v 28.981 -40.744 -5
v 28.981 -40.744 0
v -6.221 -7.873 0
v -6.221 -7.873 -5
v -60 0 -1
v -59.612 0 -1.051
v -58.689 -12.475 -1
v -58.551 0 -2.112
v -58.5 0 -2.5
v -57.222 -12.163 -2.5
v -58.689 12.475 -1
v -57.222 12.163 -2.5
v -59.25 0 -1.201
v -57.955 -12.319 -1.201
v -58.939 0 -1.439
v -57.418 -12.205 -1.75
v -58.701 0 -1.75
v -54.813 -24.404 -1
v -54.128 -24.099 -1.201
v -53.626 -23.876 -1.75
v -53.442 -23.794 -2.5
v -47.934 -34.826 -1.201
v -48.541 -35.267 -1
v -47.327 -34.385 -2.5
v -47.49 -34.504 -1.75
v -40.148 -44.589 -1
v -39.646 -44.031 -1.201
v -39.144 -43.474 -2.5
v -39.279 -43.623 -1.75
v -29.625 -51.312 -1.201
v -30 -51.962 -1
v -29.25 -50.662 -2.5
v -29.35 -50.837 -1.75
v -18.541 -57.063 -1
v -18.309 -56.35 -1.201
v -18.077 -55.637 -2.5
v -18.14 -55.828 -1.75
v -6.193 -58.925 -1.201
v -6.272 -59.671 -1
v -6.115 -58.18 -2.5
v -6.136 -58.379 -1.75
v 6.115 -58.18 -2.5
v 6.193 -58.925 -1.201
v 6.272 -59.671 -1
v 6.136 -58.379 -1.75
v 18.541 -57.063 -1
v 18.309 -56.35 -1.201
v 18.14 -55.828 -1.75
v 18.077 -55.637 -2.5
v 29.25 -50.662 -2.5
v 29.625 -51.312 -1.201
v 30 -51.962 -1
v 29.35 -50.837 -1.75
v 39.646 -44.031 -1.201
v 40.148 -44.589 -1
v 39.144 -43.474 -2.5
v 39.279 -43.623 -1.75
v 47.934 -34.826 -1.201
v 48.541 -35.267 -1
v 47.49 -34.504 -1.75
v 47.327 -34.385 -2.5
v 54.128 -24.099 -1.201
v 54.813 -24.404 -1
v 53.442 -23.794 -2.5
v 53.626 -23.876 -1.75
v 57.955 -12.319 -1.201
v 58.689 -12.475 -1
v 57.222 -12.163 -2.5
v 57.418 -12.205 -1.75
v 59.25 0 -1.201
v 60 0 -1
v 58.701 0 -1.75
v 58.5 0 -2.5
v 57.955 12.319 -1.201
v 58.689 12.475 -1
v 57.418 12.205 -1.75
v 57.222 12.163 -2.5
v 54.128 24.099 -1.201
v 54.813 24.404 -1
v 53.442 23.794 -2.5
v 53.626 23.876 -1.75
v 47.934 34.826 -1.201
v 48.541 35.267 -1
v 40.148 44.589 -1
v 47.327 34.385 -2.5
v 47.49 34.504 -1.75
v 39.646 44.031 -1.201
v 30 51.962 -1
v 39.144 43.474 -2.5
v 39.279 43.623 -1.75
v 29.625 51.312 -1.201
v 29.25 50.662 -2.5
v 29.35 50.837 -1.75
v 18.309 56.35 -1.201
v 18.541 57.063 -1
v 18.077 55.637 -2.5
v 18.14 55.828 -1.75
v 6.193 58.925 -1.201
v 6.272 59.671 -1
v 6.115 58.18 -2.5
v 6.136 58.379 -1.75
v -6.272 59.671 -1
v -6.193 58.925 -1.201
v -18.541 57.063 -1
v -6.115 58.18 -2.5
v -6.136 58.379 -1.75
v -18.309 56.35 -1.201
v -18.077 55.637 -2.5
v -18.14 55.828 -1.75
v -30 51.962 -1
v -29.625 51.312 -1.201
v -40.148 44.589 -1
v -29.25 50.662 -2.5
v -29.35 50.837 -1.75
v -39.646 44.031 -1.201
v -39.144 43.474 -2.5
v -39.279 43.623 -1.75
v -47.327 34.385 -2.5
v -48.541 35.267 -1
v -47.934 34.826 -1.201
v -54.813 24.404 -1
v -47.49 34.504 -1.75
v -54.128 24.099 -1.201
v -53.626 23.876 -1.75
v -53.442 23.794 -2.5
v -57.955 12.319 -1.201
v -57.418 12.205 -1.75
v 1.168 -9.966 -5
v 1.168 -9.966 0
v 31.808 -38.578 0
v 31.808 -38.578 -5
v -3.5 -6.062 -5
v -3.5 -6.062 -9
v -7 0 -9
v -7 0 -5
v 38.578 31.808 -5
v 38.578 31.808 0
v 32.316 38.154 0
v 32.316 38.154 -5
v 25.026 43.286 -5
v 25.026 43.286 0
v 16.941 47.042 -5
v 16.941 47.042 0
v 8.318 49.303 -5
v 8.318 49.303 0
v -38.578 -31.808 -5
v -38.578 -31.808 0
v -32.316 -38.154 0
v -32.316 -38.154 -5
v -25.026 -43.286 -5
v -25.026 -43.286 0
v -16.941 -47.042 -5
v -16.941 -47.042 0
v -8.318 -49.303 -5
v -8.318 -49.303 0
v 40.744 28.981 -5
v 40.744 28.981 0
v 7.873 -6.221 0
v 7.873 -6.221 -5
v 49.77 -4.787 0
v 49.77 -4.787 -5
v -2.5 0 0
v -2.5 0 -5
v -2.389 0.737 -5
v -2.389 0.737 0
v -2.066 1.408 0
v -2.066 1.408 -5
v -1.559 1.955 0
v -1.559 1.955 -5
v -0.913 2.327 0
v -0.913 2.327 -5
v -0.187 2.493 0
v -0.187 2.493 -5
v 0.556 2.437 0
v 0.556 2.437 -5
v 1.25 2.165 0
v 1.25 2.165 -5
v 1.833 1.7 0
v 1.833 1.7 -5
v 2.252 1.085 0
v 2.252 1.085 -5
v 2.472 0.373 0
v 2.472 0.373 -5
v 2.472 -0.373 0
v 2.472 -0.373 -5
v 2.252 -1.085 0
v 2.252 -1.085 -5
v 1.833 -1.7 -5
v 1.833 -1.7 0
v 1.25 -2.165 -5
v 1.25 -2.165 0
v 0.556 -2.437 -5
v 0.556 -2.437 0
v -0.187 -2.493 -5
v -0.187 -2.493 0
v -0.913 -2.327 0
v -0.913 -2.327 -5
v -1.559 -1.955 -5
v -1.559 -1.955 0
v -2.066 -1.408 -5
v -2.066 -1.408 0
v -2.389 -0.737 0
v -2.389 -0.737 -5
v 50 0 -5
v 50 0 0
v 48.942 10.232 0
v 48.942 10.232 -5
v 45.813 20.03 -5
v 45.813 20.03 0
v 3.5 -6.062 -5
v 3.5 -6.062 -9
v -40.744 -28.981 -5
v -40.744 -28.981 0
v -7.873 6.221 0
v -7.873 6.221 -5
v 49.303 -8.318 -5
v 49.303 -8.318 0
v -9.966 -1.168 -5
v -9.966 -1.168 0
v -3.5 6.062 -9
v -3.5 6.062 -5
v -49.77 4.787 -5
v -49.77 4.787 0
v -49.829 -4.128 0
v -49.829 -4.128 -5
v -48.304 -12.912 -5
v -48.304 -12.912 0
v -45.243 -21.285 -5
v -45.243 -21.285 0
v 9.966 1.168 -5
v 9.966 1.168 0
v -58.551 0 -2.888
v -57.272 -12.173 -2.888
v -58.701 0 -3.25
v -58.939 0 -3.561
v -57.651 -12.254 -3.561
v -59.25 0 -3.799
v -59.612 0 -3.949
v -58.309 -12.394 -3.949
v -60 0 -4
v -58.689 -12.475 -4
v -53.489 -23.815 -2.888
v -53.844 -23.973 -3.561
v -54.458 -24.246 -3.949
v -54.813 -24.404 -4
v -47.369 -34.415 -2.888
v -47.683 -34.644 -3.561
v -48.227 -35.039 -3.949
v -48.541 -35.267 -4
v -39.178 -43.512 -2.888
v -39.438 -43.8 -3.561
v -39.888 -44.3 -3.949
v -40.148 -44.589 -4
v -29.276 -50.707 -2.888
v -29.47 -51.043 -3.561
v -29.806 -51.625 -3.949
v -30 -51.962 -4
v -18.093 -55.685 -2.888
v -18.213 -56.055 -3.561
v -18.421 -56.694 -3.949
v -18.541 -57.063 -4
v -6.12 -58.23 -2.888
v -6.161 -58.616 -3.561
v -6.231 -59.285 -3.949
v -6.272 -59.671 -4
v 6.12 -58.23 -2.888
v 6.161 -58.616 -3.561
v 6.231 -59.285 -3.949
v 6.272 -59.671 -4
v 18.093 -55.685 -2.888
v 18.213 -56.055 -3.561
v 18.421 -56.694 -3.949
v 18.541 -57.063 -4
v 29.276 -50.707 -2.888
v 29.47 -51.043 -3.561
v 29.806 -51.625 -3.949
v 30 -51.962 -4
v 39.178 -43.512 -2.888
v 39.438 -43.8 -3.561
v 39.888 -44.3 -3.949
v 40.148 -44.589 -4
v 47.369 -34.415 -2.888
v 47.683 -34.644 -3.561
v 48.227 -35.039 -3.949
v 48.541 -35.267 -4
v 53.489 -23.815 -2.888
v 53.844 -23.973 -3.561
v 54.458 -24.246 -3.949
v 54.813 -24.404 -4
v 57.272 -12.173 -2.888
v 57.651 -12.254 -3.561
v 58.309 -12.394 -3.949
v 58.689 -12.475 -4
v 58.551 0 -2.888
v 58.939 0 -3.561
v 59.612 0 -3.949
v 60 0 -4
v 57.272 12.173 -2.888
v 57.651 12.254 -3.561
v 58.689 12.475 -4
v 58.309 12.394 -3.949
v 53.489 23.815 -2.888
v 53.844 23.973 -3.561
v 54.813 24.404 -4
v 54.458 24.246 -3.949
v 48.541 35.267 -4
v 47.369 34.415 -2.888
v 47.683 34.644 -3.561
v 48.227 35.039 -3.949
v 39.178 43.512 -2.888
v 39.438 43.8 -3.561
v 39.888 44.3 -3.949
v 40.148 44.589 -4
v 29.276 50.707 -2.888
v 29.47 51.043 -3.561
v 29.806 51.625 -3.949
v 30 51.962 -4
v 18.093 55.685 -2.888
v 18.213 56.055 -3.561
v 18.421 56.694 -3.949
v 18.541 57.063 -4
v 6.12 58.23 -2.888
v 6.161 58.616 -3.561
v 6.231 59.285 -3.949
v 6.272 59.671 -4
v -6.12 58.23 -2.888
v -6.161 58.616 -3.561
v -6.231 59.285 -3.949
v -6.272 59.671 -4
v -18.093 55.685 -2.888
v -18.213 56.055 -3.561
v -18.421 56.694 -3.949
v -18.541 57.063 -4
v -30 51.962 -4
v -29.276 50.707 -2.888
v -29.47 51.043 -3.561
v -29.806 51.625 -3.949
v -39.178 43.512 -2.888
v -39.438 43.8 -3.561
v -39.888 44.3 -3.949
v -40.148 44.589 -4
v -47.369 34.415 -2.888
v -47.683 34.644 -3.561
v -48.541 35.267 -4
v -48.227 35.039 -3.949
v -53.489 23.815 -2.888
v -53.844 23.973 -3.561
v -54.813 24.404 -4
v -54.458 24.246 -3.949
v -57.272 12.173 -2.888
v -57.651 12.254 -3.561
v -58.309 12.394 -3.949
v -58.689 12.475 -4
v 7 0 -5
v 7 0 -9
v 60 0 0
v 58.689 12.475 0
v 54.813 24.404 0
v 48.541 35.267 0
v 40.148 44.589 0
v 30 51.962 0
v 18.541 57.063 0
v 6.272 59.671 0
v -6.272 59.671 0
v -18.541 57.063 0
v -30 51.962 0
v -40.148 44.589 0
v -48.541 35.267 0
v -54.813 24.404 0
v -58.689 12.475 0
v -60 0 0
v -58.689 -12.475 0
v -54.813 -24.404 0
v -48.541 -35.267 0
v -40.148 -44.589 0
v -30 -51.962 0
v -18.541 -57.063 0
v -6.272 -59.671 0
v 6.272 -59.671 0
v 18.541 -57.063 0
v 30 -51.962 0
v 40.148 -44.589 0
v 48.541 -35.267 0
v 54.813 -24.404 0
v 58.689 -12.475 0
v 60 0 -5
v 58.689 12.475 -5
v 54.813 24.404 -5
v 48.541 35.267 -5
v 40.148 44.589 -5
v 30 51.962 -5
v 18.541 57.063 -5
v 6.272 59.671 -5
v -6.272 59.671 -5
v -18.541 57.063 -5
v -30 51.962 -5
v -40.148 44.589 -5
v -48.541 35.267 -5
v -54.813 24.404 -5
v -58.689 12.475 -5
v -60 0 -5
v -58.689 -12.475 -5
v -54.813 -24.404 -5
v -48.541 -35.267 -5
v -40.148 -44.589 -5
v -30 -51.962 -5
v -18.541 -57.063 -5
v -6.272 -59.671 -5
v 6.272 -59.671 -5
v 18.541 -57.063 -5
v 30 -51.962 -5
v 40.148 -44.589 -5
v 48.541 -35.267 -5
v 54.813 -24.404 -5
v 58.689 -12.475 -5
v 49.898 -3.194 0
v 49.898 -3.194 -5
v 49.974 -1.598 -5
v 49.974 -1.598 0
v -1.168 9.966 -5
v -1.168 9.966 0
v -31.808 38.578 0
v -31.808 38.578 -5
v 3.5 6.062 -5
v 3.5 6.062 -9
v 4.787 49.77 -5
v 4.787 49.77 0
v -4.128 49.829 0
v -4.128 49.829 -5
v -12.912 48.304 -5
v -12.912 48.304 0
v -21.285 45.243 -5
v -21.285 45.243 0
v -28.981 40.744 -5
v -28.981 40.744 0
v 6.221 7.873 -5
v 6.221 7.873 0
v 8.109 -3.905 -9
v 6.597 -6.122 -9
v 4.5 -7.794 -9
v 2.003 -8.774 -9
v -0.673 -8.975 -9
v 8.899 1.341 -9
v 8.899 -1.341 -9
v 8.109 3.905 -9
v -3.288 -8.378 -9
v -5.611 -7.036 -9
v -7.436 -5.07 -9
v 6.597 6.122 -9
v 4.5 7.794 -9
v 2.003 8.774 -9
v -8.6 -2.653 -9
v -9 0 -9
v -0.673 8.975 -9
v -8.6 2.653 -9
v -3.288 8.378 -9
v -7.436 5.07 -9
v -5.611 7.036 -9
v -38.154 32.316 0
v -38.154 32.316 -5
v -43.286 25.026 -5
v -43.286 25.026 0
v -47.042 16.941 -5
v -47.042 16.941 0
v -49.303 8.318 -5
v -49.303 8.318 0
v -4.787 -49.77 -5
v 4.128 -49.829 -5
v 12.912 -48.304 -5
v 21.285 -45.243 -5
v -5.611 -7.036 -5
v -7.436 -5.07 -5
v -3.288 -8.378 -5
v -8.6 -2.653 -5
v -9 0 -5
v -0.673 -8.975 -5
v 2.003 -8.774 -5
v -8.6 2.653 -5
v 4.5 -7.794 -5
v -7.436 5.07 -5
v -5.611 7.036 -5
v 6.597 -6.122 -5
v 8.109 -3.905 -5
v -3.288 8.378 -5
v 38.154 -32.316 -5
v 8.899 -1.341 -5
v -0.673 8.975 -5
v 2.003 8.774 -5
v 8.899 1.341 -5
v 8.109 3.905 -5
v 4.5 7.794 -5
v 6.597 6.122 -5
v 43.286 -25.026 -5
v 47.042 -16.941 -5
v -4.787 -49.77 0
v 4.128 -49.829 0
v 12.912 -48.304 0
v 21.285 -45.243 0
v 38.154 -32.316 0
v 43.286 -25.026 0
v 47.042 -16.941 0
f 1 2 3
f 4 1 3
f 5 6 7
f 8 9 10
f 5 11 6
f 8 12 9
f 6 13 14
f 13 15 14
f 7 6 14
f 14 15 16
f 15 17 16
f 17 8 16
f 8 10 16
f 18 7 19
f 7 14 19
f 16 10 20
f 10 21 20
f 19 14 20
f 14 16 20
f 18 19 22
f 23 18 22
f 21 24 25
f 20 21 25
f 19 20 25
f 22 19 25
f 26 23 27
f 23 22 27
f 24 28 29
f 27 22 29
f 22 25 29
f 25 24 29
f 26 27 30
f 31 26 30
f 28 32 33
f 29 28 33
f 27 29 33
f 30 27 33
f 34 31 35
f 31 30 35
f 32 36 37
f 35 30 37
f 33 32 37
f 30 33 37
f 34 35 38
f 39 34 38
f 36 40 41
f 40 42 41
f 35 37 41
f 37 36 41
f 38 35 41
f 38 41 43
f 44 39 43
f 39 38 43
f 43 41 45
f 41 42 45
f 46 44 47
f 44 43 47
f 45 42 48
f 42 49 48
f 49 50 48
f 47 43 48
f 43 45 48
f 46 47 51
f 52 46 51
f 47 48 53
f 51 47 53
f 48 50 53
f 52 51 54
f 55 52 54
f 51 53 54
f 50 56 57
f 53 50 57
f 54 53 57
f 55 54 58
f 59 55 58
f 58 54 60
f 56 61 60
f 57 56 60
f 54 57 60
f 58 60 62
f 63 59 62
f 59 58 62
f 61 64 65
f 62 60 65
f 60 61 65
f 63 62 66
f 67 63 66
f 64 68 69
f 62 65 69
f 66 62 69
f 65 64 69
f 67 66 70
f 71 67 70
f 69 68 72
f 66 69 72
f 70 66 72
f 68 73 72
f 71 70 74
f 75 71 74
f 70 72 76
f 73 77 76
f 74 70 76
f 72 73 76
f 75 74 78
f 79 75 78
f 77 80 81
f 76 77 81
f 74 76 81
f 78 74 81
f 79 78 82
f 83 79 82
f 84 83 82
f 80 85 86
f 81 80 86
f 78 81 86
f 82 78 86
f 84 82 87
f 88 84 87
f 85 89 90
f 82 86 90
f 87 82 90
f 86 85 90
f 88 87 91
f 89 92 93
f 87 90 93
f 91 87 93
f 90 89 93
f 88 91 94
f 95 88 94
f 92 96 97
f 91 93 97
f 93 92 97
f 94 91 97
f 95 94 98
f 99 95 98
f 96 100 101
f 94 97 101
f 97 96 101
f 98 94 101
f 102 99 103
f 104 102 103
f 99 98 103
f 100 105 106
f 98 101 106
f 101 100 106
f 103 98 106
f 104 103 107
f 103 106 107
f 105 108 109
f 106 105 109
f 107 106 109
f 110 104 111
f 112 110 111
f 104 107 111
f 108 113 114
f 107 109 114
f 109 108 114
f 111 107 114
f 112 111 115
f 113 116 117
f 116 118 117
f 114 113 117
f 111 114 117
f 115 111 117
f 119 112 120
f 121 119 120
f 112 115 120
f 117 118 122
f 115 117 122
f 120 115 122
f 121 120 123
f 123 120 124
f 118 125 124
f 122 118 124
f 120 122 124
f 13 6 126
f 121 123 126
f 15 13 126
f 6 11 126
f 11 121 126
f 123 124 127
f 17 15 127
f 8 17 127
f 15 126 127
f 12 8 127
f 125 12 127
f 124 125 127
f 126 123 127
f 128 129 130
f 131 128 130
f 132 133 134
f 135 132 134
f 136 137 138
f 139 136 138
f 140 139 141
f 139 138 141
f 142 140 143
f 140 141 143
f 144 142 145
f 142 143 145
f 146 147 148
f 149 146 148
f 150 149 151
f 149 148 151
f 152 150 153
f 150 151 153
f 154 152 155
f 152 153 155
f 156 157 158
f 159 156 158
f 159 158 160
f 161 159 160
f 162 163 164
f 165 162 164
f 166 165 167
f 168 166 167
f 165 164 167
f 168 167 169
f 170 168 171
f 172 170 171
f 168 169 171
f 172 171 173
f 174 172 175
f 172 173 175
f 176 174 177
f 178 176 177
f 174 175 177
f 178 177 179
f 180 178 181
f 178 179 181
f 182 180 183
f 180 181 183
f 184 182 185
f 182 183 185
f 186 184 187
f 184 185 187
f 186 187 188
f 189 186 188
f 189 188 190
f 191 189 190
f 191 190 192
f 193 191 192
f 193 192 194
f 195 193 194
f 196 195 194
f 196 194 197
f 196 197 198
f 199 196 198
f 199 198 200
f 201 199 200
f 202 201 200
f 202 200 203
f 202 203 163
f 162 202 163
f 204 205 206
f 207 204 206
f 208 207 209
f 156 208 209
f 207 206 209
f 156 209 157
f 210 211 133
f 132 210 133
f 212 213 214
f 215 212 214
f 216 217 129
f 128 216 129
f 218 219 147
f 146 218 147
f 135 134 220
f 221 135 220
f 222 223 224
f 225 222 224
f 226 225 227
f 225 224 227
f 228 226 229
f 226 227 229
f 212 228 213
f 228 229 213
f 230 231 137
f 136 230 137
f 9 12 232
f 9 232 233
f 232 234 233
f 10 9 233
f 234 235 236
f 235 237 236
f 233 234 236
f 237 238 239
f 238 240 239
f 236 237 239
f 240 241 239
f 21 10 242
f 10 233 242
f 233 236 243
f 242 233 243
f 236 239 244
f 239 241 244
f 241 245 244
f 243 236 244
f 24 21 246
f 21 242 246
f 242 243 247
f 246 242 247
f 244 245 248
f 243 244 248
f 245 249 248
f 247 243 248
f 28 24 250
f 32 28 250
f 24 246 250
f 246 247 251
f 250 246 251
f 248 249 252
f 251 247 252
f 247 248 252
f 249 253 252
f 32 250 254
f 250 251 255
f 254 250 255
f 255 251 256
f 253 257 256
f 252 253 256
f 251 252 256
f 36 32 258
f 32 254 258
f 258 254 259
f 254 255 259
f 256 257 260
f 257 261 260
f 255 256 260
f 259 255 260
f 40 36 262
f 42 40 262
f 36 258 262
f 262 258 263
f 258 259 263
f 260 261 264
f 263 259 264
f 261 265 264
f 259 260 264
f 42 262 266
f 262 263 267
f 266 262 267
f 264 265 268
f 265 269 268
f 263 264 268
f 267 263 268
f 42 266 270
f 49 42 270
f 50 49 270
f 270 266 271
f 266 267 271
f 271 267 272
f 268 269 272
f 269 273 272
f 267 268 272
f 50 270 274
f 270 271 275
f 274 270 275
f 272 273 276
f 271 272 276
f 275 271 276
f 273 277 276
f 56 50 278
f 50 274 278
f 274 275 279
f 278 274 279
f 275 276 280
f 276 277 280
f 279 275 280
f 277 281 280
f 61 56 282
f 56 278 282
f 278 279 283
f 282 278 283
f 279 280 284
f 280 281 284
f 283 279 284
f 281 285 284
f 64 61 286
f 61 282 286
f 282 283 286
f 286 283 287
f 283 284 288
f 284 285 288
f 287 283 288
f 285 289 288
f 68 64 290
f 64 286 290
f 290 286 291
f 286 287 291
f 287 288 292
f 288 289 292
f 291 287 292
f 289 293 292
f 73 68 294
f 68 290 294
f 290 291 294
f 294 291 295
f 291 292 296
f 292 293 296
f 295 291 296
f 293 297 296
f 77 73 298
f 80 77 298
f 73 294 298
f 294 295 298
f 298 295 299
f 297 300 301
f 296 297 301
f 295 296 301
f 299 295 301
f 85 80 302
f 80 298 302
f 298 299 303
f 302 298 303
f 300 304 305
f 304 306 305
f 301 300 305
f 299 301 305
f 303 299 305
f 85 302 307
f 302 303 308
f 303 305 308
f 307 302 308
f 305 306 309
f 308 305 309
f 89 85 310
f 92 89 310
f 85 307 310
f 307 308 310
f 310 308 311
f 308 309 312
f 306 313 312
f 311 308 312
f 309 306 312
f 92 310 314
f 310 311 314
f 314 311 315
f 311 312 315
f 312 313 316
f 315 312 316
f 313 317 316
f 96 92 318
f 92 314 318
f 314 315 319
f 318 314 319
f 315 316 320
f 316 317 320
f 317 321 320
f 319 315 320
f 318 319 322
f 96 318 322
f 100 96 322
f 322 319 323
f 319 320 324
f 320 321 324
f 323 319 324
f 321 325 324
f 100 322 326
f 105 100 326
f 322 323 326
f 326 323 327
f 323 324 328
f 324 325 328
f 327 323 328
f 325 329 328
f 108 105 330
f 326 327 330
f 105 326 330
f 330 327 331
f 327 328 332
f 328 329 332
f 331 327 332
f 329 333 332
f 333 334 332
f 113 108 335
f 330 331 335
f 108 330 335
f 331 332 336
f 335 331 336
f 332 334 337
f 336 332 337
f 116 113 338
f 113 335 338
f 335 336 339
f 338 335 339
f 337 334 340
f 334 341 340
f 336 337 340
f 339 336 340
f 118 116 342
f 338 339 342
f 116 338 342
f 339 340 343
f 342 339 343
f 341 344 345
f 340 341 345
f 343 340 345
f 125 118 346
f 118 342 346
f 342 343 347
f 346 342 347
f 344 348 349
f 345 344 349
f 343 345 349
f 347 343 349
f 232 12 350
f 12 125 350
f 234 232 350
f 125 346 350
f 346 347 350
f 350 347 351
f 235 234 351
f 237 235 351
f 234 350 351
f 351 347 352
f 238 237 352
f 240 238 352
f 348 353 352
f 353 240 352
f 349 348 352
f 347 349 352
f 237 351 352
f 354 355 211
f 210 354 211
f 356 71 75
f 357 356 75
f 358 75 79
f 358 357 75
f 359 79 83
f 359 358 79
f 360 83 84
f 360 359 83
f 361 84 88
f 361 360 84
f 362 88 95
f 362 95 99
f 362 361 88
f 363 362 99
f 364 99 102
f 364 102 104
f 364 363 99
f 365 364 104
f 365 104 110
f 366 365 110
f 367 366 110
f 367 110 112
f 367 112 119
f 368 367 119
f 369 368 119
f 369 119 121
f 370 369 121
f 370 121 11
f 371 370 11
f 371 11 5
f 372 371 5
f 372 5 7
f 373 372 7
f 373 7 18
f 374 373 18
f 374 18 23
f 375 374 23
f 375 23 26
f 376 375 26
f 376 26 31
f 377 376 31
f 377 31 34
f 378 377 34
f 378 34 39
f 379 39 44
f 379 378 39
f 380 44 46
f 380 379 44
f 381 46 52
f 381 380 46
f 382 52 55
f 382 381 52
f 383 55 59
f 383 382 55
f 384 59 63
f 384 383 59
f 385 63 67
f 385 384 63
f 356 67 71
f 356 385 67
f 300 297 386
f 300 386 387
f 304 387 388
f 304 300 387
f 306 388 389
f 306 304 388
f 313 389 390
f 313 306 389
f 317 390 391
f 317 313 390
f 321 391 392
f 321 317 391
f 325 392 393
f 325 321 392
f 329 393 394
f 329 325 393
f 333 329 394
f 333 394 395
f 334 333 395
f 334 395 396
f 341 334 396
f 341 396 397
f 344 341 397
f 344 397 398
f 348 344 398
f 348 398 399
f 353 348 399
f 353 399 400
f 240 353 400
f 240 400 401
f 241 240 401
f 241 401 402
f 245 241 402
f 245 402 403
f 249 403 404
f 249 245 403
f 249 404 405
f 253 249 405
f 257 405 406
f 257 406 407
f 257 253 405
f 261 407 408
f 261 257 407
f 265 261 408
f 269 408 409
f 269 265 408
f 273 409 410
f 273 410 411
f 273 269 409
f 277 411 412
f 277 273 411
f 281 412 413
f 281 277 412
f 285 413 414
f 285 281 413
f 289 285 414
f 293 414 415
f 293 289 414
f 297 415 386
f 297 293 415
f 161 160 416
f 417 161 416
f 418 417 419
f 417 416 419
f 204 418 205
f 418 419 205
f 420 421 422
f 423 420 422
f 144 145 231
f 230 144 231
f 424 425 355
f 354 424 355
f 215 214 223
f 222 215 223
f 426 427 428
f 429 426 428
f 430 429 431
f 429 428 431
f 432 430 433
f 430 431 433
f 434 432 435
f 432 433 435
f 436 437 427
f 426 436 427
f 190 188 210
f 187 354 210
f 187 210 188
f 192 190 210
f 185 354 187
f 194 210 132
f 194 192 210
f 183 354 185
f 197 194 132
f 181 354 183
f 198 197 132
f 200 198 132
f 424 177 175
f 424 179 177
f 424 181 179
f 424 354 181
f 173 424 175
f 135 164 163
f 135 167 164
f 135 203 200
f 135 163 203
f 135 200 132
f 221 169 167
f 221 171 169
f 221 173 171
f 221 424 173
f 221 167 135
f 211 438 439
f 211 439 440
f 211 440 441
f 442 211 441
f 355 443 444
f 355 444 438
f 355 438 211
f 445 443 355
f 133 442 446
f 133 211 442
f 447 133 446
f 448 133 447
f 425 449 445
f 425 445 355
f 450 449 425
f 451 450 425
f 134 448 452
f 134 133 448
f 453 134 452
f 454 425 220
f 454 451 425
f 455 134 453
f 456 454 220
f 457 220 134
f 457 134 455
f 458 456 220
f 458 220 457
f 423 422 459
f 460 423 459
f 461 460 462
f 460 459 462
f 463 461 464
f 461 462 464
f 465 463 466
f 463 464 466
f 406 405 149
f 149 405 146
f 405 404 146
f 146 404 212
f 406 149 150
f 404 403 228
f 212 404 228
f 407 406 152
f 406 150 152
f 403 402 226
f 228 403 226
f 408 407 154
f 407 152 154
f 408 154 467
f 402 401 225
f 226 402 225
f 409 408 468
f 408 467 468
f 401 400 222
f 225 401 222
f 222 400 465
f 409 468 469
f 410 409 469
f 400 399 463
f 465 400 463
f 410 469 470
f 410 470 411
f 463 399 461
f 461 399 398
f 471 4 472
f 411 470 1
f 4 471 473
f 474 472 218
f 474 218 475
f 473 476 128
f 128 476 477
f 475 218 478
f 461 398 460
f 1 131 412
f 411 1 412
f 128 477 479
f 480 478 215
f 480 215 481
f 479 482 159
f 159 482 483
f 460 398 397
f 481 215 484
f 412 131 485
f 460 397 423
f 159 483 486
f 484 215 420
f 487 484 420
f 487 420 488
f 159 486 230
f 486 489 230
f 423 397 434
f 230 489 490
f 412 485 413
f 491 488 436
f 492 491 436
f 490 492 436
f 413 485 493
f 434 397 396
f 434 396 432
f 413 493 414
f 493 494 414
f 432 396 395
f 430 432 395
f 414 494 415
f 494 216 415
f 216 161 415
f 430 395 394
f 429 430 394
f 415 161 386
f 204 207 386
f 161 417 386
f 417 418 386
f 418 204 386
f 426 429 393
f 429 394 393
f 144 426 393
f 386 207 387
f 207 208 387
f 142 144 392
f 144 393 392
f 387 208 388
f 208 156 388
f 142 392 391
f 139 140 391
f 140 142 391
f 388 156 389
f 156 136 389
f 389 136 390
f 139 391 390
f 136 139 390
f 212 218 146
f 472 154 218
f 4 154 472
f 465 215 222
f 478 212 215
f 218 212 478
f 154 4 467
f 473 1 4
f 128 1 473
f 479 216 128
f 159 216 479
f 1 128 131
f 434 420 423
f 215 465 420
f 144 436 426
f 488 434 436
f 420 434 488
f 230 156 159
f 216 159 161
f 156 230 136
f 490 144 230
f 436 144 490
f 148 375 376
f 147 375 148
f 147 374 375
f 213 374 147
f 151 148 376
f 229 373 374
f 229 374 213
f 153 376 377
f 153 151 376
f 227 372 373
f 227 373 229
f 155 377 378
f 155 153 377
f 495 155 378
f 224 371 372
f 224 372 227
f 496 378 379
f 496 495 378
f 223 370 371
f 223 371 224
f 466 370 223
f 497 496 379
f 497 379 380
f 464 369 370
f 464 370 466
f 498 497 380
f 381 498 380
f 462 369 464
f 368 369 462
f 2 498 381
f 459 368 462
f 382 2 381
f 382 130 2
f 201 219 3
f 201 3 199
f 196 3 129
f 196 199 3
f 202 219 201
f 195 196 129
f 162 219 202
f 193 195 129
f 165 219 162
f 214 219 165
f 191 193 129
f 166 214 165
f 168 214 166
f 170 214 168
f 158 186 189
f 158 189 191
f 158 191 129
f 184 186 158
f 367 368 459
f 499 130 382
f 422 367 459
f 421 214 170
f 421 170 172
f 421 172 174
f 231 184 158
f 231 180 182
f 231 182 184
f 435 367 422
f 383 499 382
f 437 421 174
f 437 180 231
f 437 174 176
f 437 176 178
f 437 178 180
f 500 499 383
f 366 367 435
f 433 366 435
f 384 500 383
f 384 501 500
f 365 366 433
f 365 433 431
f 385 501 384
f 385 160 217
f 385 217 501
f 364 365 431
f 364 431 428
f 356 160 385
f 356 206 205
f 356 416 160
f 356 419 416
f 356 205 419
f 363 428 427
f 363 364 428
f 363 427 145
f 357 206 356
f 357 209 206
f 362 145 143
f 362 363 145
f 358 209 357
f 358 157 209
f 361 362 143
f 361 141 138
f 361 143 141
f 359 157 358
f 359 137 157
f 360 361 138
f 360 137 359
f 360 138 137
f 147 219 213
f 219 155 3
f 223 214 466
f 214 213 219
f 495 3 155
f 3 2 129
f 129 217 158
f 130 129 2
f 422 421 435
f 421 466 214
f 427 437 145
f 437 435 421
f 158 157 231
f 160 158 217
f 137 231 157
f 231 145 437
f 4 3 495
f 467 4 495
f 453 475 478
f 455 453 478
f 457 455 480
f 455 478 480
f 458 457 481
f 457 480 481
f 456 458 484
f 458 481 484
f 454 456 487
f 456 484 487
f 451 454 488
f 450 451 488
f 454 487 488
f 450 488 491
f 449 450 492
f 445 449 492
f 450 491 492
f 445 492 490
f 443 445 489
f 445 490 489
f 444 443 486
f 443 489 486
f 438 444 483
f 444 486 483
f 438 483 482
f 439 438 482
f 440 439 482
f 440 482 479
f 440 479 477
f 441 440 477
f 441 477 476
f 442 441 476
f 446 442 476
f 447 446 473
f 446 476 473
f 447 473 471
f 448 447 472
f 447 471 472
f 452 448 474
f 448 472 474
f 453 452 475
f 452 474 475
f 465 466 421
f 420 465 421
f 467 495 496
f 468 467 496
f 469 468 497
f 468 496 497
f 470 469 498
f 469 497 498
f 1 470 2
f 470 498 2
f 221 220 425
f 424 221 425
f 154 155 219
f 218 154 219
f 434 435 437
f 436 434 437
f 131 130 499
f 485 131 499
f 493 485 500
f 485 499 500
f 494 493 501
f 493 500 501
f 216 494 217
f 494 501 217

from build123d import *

# Parameters (mm, degrees)
SKETCH1_R           = 60
BOSS_EXTRUDE1_DEPTH = 5
CUT_EXTRUDE2_DEPTH  = 5
SKETCH9_R           = 1.5
SKETCH10_R          = 9
BOSS_EXTRUDE2_DEPTH = 4
CUT_EXTRUDE4_DEPTH  = 4
SKETCH12_R          = 2.5
CUT_EXTRUDE5_DEPTH  = 6


with BuildPart() as part:
    # Sketch1 → Boss-Extrude1 (new body)
    with BuildSketch(Plane.XY):
        Circle(SKETCH1_R)
    extrude(amount=-BOSS_EXTRUDE1_DEPTH)

    # Sketch7 → Cut-Extrude2 (cut)
    with BuildSketch(Plane.XY):
        with BuildLine():
            ThreePointArc((-4.786620503, -49.770355275), (12.911635843, -48.304137088), (28.981073455, -40.744292624))
            Line((28.981073455, -40.744292624), (-6.221076455, -7.872795103))
            Line((-6.221076455, -7.872795103), (-4.786620503, -49.770355275))
        make_face()
        with BuildLine():
            Line((49.303279175, -8.317852043), (1.167941456, -9.965872152))
            Line((1.167941456, -9.965872152), (31.8083039, -38.577607534))
            ThreePointArc((31.8083039, -38.577607534), (43.286088156, -25.026277633), (49.303279175, -8.317852043))
        make_face()
        with BuildLine():
            Line((40.744292624, 28.981073455), (7.872795103, -6.221076455))
            Line((7.872795103, -6.221076455), (49.770355275, -4.786620503))
            ThreePointArc((49.770355275, -4.786620503), (49.94255582, -2.396063049), (50, 0))
            ThreePointArc((50, 0), (47.629899387, 15.211597037), (40.744292624, 28.981073455))
        make_face()
        with BuildLine():
            Line((9.965872152, 1.167941456), (38.577607534, 31.8083039))
            ThreePointArc((38.577607534, 31.8083039), (25.026277633, 43.286088156), (8.317852043, 49.303279175))
            Line((8.317852043, 49.303279175), (9.965872152, 1.167941456))
        make_face()
        with BuildLine():
            Line((6.221076455, 7.872795103), (4.786620503, 49.770355275))
            ThreePointArc((4.786620503, 49.770355275), (-12.911635843, 48.304137088), (-28.981073455, 40.744292624))
            Line((-28.981073455, 40.744292624), (6.221076455, 7.872795103))
        make_face()
        with BuildLine():
            Line((-1.167941456, 9.965872152), (-31.8083039, 38.577607534))
            ThreePointArc((-31.8083039, 38.577607534), (-43.286088156, 25.026277633), (-49.303279175, 8.317852043))
            Line((-49.303279175, 8.317852043), (-1.167941456, 9.965872152))
        make_face()
        with BuildLine():
            ThreePointArc((-49.770355275, 4.786620503), (-48.304137088, -12.911635843), (-40.744292624, -28.981073455))
            Line((-40.744292624, -28.981073455), (-7.872795103, 6.221076455))
            Line((-7.872795103, 6.221076455), (-49.770355275, 4.786620503))
        make_face()
        with BuildLine():
            ThreePointArc((-38.577607534, -31.8083039), (-25.026277633, -43.286088156), (-8.317852043, -49.303279175))
            Line((-8.317852043, -49.303279175), (-9.965872152, -1.167941456))
            Line((-9.965872152, -1.167941456), (-38.577607534, -31.8083039))
        make_face()
    extrude(amount=-CUT_EXTRUDE2_DEPTH, mode=Mode.SUBTRACT)

    # Sketch9 → Cut-Revolve3 (revolve, cut)
    with BuildSketch(Plane(origin=(0, 0, 0), x_dir=(1, 0, 0), z_dir=(0, 1, 0))):
        with Locations((-60, 2.5)):
            Circle(SKETCH9_R)
    revolve(axis=Axis((0, 0, -92.148103423), (0, 0, 1)), mode=Mode.SUBTRACT)

    # Sketch10 → Boss-Extrude2 (add)
    with BuildSketch(Plane(origin=(0, 0, -5), x_dir=(-1, 0, 0), z_dir=(0, 0, -1))):
        Circle(SKETCH10_R)
    extrude(amount=BOSS_EXTRUDE2_DEPTH)

    # Sketch11 → Cut-Extrude4 (cut)
    with BuildSketch(Plane(origin=(0, 0, -9), x_dir=(-1, 0, 0), z_dir=(0, 0, -1))):
        Polygon((7, 0), (3.5, 6.062177826), (-3.5, 6.062177826), (-7, 0), (-3.5, -6.062177826), (3.5, -6.062177826), align=None)
    extrude(amount=-CUT_EXTRUDE4_DEPTH, mode=Mode.SUBTRACT)

    # Sketch12 → Cut-Extrude5 (cut, through all)
    with BuildSketch(Plane(origin=(0, 0, -5), x_dir=(-1, 0, 0), z_dir=(0, 0, -1))):
        Circle(SKETCH12_R)
    extrude(amount=-CUT_EXTRUDE5_DEPTH, mode=Mode.SUBTRACT)


solid = part.part
